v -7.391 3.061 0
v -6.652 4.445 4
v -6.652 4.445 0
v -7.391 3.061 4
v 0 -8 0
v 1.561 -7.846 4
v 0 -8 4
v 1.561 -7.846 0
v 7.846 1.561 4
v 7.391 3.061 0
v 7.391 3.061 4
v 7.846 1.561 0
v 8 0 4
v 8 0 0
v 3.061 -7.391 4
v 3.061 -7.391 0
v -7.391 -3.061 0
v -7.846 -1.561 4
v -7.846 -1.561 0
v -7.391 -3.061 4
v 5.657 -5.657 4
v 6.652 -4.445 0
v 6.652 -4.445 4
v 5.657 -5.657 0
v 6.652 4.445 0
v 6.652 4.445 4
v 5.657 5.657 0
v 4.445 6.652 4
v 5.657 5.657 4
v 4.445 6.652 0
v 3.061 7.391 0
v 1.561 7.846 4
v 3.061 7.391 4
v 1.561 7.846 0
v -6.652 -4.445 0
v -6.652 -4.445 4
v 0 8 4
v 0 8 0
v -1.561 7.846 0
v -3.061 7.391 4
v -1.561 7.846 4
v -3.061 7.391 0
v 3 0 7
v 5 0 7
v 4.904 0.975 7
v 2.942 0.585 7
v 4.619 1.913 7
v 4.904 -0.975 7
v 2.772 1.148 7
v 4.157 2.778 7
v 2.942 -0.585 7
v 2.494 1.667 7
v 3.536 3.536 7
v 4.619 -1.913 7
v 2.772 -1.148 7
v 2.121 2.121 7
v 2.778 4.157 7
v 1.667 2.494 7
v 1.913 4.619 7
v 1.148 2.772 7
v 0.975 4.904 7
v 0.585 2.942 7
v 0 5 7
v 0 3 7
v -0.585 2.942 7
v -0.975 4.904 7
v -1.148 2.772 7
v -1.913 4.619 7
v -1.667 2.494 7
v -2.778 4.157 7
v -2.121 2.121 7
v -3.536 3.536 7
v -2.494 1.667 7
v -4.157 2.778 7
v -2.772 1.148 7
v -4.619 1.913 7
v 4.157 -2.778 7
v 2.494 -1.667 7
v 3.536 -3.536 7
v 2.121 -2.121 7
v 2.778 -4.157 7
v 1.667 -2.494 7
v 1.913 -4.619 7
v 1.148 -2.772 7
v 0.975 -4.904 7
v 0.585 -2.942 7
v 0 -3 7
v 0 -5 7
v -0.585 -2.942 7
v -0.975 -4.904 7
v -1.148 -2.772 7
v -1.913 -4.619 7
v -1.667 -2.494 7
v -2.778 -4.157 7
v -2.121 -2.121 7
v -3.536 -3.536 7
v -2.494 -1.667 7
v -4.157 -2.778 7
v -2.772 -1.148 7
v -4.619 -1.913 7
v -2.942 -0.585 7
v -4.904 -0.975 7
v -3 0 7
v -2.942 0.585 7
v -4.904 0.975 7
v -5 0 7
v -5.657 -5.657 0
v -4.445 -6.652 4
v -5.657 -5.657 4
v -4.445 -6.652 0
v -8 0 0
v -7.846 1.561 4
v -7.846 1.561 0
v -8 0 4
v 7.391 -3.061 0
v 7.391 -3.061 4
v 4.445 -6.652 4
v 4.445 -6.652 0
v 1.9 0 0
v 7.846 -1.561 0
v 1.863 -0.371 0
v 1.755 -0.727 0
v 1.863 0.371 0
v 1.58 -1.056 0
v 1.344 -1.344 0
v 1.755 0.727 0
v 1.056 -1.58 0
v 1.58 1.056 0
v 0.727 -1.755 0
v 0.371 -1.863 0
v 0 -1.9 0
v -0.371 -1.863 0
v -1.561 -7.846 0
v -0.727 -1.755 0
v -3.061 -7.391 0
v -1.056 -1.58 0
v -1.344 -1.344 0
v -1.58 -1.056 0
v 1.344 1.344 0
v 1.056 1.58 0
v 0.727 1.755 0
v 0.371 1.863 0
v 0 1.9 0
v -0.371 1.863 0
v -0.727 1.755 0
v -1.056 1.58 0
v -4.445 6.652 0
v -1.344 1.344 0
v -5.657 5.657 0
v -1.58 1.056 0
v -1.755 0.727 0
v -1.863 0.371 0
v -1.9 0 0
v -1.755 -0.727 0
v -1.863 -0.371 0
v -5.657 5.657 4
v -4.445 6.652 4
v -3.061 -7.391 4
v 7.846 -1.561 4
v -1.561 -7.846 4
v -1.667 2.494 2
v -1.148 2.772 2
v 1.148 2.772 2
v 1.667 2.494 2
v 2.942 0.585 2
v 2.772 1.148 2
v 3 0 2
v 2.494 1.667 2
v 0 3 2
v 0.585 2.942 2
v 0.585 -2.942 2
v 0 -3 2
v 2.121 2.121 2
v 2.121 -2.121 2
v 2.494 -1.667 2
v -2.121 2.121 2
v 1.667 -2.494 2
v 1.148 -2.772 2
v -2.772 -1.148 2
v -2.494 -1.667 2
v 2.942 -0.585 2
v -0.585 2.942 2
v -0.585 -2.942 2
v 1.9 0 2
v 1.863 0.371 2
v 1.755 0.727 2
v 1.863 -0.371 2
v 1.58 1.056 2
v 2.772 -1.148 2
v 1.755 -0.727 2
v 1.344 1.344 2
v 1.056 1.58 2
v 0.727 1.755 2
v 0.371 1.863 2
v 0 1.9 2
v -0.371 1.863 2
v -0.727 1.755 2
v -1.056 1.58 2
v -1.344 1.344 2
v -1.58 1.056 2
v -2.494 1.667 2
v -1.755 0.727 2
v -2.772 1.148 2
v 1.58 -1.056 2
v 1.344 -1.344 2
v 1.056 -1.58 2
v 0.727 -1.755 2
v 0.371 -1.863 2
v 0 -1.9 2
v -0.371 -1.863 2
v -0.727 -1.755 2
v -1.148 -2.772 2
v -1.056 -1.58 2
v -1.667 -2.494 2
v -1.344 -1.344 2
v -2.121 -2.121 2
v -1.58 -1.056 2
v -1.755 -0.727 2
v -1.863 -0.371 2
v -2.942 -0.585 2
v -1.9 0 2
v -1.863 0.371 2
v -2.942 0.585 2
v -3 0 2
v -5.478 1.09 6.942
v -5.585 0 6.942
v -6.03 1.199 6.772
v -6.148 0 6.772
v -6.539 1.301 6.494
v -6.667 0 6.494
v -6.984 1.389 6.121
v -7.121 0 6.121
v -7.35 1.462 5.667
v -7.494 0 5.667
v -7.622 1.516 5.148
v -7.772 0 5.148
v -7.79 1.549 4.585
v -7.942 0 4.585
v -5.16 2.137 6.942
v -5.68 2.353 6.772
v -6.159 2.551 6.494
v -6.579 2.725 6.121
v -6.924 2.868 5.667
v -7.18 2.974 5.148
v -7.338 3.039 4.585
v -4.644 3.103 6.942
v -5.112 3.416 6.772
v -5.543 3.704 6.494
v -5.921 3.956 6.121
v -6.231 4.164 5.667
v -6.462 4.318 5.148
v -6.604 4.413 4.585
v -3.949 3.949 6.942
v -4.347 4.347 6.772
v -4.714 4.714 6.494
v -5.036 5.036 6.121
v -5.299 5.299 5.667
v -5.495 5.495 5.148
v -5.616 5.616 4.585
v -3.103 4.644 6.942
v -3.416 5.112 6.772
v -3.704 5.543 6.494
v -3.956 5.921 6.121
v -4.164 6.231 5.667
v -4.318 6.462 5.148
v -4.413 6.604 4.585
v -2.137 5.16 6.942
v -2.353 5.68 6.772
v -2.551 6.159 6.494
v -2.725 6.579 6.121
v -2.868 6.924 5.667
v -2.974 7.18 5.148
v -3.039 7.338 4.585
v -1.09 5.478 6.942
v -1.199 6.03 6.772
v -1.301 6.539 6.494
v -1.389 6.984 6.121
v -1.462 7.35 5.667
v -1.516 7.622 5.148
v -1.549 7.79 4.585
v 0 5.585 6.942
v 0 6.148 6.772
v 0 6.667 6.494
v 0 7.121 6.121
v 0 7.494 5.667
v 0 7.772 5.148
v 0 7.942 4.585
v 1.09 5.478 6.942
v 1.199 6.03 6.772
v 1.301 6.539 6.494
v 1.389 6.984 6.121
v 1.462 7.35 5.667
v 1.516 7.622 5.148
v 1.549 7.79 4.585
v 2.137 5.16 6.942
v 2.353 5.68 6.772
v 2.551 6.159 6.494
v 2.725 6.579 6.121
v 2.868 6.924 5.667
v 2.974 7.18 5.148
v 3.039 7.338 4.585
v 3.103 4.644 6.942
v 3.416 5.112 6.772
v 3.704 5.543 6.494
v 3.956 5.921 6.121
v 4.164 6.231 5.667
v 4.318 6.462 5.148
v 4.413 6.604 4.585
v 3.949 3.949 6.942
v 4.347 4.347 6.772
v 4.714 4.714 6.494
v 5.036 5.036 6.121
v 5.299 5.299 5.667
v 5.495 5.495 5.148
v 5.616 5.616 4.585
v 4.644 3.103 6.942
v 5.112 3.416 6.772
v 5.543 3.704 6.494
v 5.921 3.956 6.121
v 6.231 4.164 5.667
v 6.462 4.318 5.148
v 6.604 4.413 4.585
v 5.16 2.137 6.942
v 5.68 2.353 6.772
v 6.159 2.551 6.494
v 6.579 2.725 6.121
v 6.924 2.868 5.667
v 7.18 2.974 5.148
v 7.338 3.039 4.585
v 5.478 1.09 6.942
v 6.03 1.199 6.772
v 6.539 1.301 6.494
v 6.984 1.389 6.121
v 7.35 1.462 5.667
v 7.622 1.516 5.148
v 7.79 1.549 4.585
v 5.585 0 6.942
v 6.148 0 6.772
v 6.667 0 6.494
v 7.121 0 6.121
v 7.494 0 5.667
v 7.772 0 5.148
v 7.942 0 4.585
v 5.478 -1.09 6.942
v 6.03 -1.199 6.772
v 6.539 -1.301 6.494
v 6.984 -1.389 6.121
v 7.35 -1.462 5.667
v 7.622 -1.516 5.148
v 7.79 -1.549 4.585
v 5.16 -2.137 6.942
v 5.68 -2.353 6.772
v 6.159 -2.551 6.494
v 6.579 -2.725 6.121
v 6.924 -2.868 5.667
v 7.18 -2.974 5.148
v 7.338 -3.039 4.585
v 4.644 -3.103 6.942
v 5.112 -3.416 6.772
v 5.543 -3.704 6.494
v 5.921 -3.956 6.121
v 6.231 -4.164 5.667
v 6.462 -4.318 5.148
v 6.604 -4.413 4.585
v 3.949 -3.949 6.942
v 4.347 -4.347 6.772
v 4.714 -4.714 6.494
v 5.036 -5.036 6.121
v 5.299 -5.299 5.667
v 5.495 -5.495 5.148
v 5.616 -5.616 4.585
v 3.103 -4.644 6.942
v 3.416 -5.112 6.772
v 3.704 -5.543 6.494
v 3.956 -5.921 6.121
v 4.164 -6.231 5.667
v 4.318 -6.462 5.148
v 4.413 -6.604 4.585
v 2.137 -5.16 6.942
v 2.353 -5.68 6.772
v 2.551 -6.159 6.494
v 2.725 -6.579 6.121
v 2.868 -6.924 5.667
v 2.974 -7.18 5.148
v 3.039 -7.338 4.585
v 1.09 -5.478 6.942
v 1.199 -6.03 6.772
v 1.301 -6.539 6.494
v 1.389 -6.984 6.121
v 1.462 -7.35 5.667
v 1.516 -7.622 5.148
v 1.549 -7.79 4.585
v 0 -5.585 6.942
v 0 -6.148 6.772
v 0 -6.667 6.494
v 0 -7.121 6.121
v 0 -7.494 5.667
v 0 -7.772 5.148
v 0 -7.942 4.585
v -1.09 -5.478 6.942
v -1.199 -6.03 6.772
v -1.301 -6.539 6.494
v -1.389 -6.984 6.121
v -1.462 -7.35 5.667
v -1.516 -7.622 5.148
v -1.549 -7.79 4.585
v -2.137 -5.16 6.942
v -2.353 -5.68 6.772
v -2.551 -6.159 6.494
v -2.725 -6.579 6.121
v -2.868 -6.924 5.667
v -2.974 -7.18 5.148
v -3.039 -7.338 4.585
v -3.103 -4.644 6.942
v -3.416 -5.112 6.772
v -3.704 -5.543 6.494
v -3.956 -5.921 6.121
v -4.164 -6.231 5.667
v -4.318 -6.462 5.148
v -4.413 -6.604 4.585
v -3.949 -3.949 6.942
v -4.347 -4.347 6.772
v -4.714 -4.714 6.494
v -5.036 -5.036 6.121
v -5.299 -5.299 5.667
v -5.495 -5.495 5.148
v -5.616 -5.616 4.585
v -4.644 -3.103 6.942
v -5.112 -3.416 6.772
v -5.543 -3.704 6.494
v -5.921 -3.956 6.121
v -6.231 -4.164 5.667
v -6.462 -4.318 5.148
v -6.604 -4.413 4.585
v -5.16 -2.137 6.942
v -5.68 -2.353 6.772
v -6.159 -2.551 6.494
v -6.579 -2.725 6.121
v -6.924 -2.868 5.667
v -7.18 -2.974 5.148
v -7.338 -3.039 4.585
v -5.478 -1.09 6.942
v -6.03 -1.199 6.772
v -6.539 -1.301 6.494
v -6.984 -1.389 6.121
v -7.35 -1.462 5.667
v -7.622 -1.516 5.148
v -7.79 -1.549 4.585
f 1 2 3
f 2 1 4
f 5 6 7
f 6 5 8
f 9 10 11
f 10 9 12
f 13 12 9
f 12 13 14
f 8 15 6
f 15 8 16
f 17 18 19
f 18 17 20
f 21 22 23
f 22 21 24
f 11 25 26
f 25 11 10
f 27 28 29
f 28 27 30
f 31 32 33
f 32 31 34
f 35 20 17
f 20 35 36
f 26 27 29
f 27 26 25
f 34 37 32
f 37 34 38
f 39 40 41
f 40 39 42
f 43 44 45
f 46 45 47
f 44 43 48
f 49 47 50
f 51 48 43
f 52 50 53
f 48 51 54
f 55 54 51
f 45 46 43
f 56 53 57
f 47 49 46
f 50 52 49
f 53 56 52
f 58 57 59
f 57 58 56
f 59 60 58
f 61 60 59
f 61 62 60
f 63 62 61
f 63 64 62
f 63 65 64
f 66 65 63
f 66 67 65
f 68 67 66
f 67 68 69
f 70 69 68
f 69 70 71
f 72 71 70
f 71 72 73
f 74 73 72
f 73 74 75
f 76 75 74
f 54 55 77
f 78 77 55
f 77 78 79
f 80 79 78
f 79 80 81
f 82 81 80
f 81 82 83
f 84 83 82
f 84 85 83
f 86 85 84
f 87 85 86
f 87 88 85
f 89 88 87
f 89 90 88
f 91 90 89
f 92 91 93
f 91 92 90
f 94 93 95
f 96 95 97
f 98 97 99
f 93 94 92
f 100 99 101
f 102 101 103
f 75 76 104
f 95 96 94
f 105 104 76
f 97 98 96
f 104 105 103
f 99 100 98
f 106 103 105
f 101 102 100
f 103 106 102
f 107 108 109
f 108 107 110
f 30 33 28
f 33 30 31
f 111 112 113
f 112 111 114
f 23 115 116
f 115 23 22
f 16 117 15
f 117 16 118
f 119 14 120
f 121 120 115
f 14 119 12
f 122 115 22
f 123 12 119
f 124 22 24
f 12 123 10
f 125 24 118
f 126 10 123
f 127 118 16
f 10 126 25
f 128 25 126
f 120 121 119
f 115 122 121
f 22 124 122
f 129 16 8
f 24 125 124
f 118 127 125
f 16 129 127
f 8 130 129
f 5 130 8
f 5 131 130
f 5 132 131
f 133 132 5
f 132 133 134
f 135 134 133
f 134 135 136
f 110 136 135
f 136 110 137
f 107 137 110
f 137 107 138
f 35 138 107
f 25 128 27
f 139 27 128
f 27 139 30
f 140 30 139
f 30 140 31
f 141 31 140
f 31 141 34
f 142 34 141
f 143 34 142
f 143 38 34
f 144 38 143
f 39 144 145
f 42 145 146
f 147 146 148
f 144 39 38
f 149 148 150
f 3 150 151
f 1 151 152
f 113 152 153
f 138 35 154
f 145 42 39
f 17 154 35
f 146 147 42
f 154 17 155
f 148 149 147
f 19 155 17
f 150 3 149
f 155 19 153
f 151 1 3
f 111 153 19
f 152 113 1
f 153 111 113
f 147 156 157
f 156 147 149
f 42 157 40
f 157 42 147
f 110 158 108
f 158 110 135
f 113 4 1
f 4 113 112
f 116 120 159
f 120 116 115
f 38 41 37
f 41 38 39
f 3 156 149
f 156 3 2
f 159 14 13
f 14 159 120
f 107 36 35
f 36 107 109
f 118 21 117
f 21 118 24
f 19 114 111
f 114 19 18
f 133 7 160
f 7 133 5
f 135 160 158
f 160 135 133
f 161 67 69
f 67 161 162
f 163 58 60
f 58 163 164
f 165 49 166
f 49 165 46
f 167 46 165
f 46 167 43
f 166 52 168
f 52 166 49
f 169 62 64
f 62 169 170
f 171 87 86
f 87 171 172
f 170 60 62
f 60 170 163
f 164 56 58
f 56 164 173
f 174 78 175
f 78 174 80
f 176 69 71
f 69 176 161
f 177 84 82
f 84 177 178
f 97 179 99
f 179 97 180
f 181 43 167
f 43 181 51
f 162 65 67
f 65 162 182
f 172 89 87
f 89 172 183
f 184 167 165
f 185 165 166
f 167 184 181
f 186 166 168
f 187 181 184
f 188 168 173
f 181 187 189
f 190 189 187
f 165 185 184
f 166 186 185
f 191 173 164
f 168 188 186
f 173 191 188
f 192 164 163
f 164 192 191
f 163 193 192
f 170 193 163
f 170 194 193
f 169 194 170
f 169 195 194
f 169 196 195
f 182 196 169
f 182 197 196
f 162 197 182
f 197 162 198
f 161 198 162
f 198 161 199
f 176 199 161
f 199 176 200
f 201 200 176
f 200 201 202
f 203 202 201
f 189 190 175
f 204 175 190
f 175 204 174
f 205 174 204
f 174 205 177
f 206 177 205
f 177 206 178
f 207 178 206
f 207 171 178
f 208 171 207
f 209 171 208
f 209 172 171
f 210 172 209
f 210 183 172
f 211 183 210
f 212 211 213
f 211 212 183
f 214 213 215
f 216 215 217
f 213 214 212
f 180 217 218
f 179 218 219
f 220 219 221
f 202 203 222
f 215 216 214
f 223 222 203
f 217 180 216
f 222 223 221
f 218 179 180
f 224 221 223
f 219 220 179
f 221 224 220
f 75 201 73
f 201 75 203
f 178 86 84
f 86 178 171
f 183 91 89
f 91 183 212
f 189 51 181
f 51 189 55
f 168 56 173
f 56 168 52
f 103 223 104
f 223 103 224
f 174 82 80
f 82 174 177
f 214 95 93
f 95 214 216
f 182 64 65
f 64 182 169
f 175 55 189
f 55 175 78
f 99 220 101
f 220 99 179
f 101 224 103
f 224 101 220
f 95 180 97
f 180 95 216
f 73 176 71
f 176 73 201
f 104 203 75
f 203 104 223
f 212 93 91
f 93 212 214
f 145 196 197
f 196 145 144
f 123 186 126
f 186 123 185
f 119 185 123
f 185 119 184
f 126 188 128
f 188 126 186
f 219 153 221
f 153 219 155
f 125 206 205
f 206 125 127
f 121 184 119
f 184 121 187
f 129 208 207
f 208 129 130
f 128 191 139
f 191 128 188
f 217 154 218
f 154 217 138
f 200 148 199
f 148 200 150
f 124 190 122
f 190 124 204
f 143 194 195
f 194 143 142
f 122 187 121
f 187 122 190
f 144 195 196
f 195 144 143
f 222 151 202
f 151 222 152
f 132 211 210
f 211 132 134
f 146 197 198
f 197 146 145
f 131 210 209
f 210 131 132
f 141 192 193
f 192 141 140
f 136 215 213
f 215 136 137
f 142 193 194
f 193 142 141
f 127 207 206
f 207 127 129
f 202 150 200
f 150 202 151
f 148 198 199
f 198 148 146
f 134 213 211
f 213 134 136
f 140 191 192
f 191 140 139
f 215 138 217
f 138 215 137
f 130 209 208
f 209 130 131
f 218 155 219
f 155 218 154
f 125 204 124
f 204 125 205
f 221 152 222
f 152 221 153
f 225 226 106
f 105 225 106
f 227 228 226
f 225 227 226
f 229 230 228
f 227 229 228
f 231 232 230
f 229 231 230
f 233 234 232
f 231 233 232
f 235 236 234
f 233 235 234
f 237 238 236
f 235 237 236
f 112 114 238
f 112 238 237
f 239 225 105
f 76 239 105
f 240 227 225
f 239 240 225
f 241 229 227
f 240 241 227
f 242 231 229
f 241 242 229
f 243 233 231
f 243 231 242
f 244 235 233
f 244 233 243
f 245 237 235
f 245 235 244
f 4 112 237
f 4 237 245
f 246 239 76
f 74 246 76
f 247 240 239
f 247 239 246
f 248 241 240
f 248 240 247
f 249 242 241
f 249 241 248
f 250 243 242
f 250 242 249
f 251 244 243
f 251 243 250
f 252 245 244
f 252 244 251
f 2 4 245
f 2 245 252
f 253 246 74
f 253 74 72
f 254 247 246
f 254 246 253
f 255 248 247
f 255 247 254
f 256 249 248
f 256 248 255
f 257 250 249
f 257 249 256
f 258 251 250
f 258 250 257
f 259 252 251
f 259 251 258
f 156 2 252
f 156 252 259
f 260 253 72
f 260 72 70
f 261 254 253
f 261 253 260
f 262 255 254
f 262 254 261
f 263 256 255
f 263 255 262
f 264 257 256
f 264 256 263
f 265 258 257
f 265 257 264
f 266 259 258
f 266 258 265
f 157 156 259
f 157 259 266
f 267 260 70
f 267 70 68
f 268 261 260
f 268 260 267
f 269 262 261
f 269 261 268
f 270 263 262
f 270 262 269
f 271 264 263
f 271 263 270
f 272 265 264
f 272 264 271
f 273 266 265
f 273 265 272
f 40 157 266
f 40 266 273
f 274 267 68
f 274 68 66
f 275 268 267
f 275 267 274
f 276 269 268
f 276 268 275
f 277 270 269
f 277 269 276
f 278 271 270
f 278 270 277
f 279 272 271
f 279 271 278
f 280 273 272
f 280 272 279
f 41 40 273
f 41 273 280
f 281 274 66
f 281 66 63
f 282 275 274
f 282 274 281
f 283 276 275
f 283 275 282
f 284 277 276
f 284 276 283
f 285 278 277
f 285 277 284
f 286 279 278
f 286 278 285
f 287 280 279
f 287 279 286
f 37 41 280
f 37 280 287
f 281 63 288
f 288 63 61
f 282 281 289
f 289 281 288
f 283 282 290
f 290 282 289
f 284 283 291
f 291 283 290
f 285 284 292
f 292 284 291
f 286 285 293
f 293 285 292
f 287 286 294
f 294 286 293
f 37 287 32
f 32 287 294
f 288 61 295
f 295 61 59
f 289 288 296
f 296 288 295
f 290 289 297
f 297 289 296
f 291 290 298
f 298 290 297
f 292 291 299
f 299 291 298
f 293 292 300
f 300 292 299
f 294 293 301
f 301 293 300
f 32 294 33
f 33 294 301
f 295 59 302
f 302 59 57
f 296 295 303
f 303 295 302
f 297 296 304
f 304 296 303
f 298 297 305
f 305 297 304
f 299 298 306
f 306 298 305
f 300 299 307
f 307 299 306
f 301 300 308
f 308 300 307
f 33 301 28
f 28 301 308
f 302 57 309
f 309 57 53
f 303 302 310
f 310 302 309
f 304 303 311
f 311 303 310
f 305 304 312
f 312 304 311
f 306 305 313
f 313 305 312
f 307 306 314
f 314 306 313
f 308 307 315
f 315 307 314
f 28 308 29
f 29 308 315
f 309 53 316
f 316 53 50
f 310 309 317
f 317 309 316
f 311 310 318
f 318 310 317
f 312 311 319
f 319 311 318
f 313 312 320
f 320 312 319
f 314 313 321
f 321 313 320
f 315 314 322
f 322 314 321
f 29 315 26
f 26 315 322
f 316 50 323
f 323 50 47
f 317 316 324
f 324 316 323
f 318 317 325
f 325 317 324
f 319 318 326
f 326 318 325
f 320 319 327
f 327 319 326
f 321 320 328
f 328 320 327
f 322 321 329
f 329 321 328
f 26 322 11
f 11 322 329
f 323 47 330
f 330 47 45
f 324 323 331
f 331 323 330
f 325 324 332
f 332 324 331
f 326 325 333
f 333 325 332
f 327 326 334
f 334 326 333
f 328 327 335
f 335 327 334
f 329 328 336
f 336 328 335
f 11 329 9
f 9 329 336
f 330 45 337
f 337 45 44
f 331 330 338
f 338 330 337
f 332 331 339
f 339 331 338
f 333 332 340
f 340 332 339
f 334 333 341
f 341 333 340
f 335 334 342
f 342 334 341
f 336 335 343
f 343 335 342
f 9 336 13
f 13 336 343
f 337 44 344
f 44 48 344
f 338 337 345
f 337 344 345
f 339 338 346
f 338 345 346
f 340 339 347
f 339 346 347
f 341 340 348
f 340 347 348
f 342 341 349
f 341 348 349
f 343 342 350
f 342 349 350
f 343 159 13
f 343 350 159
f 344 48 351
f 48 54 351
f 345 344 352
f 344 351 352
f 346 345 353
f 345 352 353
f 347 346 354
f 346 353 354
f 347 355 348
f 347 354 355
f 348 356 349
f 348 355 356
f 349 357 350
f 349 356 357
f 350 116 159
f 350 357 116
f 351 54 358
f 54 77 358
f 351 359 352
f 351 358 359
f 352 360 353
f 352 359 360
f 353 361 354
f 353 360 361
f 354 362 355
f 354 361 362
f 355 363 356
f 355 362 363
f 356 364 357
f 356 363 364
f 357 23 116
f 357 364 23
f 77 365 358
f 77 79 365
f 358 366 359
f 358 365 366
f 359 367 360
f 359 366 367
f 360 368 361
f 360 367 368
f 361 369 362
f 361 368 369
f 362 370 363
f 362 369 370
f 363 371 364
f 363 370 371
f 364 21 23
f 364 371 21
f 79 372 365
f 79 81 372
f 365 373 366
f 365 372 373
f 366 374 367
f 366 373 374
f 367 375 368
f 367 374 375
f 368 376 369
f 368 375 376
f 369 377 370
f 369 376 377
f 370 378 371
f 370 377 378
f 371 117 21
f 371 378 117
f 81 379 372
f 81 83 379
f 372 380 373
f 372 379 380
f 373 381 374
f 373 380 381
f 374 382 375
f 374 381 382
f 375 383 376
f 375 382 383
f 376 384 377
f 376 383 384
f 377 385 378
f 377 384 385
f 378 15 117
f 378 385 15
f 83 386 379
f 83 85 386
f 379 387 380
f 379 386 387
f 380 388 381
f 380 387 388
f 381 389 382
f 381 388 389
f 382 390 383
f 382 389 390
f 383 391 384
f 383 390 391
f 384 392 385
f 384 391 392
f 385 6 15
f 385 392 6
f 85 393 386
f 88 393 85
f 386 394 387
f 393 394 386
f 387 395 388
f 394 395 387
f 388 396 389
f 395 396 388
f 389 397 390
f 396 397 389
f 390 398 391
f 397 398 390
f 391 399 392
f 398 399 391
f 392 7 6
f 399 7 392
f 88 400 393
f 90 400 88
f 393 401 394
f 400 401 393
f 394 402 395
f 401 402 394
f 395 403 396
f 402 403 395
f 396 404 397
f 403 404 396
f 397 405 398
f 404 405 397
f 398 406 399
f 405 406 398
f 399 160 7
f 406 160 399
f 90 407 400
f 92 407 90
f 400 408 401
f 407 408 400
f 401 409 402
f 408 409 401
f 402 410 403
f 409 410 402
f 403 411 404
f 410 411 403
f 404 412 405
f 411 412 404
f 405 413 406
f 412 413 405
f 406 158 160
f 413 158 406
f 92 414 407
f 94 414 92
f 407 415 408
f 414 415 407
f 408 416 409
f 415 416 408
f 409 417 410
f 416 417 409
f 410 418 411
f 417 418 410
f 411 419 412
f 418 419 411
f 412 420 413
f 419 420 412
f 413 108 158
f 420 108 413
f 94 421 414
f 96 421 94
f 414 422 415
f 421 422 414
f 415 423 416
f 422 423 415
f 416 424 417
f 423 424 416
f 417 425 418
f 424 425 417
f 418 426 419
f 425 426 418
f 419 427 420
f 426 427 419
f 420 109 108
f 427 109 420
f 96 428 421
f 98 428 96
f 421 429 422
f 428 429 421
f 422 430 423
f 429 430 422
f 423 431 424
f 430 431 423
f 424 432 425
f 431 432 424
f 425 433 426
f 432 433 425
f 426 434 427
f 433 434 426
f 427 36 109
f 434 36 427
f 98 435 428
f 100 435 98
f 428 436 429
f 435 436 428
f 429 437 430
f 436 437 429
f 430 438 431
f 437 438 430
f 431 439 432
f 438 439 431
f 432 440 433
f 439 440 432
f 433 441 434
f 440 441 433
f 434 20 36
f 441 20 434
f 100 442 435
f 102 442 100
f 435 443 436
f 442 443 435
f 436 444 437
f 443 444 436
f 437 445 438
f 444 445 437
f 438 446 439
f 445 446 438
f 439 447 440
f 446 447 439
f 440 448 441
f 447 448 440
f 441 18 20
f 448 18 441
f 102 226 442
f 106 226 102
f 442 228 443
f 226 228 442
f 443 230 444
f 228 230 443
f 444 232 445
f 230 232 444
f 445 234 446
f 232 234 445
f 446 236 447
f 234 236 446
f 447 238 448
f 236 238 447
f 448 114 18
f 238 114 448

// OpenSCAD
// The height of the foot
height = 7;
// The diameter of the foot
diameter = 16;
// The radius of the rounding
roundRadius = 3;

// The diameter of the screw hole
holeDiameter = 6;
// The diameter of the screw
screwDiameter = 3.8;
// The thickness of the base, which the screw is screwed on
holeBaseThickness = 2;


// The number of faces used (detail)
numFaces = 32; // [16,32,64,128]

$fn = numFaces;

difference()
{
    cylinder(h=height, r=diameter/2);
    translate([0,0,holeBaseThickness])
    cylinder(h=height-holeBaseThickness+1, r = holeDiameter/2);
    translate([0,0,-1])
    cylinder(h=holeBaseThickness+2, r = screwDiameter/2);
    roundNegative();
}

module roundNegative()
{
    translate([0,0,height - roundRadius])
    rotate_extrude()
    {
        translate([diameter/2-roundRadius,0,0])
        difference()
        {
            square(roundRadius+1);
            circle(roundRadius);
        }
    }
}
